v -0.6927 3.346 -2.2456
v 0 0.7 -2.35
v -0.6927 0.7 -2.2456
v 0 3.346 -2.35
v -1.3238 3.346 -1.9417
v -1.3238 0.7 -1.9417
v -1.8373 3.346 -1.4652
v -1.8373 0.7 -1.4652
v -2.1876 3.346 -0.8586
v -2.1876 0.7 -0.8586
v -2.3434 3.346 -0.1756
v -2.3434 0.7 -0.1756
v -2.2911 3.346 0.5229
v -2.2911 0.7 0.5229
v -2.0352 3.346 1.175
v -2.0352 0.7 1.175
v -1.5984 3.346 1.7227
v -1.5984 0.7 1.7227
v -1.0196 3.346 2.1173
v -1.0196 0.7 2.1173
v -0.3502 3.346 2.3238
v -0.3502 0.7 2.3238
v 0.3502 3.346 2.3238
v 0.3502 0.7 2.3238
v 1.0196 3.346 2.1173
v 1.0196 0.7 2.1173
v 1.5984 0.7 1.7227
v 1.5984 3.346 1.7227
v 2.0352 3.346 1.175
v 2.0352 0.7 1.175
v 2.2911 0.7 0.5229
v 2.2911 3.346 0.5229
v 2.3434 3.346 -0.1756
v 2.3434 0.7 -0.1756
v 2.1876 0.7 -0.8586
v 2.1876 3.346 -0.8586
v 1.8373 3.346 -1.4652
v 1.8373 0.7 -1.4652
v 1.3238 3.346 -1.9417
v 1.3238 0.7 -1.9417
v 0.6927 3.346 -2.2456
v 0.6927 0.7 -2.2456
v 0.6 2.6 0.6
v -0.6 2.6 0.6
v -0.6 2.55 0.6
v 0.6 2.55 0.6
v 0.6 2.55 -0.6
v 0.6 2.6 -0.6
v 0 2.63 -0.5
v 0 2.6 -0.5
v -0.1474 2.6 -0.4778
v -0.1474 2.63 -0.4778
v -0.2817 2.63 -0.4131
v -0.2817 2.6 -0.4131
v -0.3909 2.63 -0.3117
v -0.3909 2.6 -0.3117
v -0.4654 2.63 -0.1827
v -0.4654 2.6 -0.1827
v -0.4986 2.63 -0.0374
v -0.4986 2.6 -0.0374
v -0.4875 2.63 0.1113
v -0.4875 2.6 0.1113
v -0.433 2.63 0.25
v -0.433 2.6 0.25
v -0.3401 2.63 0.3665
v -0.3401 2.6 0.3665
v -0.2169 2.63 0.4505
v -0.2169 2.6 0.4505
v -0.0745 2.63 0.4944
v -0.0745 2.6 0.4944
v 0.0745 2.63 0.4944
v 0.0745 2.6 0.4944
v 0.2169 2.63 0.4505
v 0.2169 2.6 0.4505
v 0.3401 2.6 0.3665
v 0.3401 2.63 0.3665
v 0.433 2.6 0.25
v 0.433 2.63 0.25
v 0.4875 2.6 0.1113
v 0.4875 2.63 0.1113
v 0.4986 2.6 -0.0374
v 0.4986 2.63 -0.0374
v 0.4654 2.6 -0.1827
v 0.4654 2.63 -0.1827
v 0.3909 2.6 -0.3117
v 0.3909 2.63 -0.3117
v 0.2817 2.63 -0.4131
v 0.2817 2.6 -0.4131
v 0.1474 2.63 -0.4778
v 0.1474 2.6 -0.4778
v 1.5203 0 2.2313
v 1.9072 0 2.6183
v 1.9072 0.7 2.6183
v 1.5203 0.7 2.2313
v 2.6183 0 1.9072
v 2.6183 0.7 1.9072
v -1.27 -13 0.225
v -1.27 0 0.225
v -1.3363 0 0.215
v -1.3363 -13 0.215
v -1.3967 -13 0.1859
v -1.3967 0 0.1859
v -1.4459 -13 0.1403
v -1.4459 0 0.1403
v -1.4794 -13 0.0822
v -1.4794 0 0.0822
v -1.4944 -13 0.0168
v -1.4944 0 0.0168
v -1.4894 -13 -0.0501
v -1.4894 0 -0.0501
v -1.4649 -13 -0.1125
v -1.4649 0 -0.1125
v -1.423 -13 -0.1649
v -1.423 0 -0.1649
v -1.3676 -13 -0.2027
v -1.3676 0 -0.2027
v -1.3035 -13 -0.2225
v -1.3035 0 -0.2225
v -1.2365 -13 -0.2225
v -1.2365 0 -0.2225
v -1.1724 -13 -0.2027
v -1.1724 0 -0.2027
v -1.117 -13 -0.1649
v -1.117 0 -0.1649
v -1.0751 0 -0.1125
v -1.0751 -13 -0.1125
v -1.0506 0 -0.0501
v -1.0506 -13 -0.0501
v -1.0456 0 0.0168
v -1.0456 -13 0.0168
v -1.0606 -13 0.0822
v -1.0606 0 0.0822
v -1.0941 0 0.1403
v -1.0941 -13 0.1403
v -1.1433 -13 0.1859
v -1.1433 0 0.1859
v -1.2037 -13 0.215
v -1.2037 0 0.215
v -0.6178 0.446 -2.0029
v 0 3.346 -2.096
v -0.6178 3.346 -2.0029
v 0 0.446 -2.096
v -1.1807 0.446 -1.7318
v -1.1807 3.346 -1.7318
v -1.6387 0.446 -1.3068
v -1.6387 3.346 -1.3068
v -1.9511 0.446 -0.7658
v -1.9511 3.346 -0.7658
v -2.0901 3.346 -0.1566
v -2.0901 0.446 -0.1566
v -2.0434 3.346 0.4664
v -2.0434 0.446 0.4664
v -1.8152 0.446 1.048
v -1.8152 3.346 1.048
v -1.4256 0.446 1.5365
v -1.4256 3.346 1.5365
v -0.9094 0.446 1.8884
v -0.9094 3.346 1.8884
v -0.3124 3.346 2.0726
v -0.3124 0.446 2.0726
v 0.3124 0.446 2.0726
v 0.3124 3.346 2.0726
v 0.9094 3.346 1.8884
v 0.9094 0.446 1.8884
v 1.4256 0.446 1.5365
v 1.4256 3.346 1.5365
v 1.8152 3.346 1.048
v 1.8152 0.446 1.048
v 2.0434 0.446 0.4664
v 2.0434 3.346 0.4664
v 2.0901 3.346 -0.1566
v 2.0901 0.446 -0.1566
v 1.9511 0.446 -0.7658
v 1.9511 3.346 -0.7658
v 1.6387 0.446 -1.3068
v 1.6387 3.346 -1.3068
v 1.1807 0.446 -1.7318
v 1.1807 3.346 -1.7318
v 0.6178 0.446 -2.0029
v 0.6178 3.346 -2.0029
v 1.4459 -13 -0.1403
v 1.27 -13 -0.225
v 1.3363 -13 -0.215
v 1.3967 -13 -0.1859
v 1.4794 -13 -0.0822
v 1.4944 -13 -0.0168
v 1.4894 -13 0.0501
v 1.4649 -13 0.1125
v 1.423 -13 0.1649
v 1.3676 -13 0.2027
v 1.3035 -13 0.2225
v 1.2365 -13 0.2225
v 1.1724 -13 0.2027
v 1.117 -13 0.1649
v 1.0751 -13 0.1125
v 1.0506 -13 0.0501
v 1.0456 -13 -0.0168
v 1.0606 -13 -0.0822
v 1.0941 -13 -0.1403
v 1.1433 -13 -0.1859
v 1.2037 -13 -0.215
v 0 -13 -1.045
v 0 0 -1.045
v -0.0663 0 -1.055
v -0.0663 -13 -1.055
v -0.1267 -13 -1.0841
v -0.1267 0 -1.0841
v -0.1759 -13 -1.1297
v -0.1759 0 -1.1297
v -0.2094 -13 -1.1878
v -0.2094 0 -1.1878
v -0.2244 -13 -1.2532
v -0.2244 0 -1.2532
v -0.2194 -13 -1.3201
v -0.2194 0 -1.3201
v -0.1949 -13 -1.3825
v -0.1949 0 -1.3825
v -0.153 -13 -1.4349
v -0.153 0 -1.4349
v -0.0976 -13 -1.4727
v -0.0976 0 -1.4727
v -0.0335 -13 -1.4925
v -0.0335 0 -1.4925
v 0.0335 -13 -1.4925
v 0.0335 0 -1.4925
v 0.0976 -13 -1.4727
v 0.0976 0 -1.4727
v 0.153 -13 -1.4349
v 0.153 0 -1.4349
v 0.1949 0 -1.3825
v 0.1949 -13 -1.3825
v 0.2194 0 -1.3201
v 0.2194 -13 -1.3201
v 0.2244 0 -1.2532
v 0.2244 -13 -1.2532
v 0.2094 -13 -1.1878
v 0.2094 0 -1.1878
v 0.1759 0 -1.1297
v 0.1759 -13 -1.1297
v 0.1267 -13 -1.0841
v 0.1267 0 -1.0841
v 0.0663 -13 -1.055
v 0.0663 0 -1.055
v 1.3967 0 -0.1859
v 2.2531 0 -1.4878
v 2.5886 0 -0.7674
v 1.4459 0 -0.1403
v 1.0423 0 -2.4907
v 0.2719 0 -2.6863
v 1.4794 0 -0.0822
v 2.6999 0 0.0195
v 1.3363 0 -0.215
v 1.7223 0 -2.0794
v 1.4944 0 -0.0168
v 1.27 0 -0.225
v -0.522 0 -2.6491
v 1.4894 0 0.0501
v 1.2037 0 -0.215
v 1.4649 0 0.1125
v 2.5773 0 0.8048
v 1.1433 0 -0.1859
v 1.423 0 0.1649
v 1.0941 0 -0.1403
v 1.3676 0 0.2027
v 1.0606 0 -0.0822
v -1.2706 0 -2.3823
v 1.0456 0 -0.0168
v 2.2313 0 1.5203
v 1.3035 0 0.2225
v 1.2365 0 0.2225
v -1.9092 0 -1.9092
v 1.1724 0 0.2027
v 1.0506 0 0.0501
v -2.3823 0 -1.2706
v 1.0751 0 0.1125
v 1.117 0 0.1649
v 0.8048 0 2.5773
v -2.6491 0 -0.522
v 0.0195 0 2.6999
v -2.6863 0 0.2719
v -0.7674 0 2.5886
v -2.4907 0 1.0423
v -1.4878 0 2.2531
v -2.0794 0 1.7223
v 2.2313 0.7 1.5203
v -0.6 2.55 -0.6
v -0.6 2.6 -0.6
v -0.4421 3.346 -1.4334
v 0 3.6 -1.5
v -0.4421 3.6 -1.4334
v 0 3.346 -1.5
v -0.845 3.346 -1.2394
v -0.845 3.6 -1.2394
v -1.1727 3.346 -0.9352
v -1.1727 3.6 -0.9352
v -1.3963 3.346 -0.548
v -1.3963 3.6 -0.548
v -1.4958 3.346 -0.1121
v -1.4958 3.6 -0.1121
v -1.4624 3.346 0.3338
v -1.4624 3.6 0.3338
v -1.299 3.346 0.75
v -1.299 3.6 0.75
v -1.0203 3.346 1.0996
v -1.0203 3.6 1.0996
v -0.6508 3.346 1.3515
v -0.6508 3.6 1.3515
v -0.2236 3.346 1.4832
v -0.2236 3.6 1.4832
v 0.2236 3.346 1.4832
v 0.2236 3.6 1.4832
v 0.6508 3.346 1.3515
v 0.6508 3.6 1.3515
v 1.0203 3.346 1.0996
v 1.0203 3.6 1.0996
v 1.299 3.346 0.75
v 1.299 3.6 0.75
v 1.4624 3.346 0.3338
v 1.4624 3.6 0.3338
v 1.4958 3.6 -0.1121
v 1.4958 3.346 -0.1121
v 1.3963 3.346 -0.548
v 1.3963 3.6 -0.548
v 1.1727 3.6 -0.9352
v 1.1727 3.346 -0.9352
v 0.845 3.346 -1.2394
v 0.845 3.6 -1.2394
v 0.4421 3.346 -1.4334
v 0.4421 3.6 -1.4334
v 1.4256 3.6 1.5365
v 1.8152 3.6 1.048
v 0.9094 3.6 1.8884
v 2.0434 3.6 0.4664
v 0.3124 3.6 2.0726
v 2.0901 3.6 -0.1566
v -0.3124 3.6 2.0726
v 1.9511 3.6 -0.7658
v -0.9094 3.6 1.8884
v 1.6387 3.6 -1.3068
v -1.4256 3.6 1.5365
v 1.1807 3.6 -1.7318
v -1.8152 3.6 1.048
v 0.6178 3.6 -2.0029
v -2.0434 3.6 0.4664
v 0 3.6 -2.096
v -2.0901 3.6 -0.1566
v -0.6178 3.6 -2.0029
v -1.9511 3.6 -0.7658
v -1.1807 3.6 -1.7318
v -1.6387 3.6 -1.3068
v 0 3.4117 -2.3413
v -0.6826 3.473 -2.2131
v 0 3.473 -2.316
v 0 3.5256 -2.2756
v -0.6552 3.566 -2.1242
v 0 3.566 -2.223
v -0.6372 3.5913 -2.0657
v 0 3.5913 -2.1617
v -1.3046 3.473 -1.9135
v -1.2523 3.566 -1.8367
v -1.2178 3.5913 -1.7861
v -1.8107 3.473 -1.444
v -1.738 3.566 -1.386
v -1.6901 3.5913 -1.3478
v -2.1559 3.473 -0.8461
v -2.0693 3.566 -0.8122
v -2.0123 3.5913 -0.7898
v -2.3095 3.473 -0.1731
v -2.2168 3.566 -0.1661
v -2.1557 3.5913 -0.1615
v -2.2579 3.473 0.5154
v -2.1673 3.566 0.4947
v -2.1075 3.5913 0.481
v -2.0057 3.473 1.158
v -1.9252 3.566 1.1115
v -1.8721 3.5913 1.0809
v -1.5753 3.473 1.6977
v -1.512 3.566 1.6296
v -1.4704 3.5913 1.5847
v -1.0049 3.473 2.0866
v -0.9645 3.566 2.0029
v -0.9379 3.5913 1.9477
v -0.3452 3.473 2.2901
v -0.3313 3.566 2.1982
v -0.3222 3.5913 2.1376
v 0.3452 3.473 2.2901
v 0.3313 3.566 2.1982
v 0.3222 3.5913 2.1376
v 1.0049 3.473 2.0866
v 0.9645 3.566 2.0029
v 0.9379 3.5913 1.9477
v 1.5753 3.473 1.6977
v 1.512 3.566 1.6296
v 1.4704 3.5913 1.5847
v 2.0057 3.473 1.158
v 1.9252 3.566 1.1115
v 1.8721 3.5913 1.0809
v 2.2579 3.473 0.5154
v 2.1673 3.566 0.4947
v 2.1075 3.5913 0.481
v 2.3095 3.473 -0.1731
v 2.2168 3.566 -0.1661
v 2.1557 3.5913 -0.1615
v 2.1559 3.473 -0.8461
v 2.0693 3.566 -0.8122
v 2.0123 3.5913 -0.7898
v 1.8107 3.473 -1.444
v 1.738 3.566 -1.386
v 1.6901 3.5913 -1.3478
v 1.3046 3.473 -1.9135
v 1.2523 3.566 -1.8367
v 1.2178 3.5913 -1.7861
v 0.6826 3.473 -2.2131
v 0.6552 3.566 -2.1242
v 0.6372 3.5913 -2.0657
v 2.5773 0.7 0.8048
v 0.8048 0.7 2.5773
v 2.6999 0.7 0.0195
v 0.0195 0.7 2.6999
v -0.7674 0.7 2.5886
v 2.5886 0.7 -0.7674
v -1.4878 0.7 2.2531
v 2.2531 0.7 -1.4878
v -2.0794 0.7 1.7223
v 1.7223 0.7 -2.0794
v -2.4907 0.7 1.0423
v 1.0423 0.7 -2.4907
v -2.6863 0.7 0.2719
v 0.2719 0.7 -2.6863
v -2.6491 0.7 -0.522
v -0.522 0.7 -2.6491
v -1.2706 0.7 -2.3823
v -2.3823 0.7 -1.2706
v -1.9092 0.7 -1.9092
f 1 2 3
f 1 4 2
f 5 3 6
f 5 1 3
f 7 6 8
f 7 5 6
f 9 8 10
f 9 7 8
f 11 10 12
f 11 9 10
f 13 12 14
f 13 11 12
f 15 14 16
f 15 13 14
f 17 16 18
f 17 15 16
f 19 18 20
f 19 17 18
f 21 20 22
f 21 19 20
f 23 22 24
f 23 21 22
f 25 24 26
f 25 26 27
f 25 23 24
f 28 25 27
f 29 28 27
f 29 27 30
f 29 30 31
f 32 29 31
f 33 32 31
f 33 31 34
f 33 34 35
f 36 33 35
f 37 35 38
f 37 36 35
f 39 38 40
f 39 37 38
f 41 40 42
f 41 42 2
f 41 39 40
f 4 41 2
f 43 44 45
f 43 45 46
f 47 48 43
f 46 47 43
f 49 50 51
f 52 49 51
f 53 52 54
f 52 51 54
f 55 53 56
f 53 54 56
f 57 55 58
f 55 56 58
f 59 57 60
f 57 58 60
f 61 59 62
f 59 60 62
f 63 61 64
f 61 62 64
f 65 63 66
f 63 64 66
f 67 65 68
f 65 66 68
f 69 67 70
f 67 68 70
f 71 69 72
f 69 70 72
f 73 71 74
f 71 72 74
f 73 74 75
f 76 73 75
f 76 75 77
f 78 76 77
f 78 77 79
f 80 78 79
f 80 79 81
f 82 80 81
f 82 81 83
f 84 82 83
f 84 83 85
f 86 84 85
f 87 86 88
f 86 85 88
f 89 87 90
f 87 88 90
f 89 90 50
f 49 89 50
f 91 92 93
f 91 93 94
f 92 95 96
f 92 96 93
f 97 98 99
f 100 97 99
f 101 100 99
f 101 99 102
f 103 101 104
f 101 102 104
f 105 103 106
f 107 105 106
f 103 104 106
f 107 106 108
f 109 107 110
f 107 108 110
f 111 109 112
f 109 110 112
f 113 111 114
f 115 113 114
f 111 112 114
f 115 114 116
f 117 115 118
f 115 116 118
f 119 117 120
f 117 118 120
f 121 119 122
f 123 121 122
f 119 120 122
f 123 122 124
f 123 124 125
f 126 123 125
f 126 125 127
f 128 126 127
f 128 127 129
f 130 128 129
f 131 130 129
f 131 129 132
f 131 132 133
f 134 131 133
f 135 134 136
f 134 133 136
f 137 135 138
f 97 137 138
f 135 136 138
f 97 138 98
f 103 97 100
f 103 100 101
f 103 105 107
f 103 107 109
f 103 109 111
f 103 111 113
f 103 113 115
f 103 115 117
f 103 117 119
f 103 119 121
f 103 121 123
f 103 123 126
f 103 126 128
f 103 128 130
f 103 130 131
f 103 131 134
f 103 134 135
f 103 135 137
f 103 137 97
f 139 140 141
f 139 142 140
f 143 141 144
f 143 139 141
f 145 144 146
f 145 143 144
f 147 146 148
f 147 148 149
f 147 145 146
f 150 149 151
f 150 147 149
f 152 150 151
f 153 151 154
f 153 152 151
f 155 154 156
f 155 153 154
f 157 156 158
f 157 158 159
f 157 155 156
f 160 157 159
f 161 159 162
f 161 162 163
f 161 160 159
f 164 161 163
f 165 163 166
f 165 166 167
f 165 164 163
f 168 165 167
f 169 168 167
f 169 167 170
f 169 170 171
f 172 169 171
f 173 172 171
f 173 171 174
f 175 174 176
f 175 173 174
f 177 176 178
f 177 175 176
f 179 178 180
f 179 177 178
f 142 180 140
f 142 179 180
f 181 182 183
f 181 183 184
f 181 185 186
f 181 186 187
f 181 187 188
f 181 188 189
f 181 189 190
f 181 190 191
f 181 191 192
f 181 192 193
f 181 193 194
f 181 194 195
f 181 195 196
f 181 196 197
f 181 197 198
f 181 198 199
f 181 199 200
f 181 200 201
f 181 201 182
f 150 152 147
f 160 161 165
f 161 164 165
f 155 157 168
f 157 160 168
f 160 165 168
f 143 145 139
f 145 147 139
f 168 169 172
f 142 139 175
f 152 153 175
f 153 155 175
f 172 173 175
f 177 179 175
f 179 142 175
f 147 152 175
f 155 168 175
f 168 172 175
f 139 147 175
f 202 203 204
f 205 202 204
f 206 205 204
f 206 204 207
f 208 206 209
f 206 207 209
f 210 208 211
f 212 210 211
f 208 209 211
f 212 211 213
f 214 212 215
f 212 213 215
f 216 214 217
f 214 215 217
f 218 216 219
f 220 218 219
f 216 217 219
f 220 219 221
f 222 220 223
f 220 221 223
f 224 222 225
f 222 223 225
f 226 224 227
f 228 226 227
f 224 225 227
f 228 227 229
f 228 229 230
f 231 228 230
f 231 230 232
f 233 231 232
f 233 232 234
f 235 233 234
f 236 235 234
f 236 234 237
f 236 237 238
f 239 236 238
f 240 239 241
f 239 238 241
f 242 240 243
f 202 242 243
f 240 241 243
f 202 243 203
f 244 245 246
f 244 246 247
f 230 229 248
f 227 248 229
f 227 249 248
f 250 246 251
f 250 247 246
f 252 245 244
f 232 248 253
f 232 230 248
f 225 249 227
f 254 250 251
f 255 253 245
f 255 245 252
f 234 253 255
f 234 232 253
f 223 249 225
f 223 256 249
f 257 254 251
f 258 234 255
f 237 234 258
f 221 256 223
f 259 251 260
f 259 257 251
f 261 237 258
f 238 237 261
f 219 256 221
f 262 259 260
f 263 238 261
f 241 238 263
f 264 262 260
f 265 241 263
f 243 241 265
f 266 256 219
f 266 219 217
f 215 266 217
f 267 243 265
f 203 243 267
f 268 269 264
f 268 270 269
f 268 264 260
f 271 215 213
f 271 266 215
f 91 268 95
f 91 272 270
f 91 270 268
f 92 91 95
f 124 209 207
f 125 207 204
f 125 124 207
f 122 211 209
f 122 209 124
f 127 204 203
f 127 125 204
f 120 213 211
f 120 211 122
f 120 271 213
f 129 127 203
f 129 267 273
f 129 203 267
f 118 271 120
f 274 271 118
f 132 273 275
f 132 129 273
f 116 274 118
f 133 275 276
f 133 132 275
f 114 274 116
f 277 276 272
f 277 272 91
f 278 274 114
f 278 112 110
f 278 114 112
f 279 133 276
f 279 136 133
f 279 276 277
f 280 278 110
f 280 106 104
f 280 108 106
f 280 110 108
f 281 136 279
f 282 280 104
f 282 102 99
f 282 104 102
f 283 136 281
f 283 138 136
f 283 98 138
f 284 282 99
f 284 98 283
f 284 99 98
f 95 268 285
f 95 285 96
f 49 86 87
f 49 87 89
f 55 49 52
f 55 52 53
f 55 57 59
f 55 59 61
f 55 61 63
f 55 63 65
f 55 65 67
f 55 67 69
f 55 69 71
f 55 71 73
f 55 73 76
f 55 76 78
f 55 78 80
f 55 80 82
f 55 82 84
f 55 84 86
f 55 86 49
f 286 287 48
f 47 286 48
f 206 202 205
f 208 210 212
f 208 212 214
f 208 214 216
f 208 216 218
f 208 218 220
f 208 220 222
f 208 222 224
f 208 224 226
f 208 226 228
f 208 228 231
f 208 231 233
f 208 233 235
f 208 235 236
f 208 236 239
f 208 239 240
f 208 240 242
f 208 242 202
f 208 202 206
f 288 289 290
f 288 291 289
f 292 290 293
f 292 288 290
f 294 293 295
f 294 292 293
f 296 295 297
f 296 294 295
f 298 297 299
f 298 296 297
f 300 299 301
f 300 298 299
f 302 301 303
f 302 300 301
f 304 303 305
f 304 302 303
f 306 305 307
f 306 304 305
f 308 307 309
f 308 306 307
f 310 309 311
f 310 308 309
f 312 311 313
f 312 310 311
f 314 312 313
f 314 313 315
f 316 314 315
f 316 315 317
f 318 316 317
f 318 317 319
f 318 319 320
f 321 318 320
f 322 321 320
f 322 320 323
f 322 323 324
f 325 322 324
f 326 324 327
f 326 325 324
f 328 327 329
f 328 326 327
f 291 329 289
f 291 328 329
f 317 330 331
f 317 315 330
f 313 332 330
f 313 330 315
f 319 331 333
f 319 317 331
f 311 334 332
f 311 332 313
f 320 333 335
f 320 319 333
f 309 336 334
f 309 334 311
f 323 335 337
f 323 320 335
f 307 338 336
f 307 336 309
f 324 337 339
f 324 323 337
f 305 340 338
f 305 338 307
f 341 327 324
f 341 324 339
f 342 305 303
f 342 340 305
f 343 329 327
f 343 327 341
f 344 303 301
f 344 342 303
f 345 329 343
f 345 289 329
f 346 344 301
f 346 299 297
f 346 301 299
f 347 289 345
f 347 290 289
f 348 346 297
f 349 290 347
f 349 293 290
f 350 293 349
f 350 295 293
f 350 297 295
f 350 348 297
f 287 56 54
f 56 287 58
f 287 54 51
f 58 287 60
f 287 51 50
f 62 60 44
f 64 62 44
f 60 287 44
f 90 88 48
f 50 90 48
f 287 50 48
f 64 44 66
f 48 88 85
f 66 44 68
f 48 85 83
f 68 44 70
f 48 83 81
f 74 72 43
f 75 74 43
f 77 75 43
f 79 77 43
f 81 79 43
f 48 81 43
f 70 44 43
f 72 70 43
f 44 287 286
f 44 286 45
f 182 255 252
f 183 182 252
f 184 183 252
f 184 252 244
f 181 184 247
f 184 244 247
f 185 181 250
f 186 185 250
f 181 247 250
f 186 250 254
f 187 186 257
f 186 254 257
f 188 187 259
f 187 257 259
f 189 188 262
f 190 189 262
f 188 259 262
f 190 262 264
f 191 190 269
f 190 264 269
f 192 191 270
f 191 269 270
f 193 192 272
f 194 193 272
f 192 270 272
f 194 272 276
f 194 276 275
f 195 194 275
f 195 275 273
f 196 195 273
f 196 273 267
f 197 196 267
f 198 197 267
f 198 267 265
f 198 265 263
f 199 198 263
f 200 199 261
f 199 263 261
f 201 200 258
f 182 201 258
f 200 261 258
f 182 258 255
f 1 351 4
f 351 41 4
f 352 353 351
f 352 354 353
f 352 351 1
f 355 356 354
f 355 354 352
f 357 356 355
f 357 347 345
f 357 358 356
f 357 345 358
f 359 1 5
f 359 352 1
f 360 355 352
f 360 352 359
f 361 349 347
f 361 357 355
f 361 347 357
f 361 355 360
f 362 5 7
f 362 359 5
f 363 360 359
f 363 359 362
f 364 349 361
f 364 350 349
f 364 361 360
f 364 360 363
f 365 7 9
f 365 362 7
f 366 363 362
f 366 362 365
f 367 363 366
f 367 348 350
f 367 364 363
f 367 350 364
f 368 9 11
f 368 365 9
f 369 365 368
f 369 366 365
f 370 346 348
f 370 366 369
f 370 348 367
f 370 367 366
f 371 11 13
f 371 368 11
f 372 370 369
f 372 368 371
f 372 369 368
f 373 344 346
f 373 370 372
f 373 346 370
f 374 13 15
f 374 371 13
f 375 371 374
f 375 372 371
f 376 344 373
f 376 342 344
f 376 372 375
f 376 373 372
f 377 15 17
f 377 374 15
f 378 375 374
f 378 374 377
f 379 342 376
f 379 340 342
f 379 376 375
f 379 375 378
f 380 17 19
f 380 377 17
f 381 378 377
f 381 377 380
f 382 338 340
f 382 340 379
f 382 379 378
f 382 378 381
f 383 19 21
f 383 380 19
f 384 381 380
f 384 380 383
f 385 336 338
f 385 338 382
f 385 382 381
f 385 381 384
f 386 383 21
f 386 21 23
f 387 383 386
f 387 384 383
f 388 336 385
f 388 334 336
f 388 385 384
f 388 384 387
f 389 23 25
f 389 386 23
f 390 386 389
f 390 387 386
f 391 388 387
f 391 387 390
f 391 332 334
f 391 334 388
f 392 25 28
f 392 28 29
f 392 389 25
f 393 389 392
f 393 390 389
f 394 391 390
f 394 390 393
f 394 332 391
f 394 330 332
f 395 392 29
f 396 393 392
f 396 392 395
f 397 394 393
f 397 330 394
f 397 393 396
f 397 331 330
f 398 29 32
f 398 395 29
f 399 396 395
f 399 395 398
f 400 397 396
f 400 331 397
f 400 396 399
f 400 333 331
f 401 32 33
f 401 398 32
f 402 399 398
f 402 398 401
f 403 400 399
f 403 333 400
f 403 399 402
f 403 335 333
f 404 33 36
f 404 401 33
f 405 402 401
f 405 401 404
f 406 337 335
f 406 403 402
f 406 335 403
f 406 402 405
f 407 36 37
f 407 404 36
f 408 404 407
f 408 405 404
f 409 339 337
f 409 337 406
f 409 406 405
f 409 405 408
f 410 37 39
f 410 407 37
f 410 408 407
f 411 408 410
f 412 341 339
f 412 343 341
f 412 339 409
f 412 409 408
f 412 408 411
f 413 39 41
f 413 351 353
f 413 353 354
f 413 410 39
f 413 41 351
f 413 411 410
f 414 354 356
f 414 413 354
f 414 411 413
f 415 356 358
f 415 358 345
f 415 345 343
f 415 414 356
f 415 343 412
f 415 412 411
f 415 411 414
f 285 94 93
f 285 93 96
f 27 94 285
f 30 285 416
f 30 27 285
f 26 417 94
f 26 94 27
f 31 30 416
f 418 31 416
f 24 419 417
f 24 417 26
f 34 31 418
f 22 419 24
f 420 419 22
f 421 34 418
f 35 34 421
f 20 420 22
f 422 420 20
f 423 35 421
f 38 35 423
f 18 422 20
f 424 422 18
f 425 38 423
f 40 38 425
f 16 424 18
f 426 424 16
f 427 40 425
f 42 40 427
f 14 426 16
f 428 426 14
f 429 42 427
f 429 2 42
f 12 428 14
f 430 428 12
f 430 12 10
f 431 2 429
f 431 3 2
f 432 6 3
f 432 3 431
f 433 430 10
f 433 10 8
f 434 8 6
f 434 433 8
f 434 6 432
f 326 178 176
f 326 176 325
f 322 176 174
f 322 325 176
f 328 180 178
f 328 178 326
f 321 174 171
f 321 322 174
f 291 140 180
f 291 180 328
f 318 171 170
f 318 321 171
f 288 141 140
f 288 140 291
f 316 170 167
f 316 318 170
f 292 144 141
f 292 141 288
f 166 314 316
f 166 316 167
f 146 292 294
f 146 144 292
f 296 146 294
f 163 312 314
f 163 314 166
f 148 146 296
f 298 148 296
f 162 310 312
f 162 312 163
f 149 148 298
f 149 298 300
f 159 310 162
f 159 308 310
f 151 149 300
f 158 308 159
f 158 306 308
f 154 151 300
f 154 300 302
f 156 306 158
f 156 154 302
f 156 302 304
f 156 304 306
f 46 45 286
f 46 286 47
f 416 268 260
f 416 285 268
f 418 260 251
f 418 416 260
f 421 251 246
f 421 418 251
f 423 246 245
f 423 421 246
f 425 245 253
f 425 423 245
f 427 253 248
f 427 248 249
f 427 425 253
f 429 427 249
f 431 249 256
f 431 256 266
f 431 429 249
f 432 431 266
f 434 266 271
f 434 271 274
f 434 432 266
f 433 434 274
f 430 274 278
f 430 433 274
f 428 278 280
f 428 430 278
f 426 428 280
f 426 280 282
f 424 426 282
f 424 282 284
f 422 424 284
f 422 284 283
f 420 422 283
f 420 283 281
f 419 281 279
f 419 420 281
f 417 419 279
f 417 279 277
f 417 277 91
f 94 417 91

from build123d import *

# Parameters (mm, degrees)
SKETCH2_R           = 2.7
BOSS_EXTRUDE1_DEPTH = 0.446
BOSS_EXTRUDE2_START = -2.6
SKETCH3_W           = 1.2
SKETCH3_H           = 1.2
BOSS_EXTRUDE2_DEPTH = 0.05
SKETCH8_R           = 0.5
BOSS_EXTRUDE6_DEPTH = 0.03
BOSS_EXTRUDE7_DEPTH = 0.7
SKETCH5_R           = 0.225
BOSS_EXTRUDE8_DEPTH = 13


with BuildPart() as part:
    # Sketch1 → Revolve-Thin2 (revolve)
    with BuildSketch(Plane.XY, mode=Mode.PRIVATE) as revolve_thin2_sk:
        with BuildLine():
            Line((2.7, 0), (2.7, 0.7))
            Line((2.7, 0.7), (2.35, 0.7))
            Line((2.35, 0.7), (2.35, 3.346))
            ThreePointArc((2.35, 3.346), (2.275605122, 3.525605122), (2.096, 3.6))
            Line((2.096, 3.6), (1.5, 3.6))
            Line((1.5, 3.6), (1.5, 3.346))
            Line((1.5, 3.346), (2.096, 3.346))
            Line((2.096, 3.346), (2.096, 0.446))
            Line((2.096, 0.446), (2.446, 0.446))
            Line((2.446, 0.446), (2.446, 0))
            Line((2.446, 0), (2.7, 0))
        make_face()
    revolve(revolve_thin2_sk.sketch.rotate(Axis((0, 0, 0), (0, 1, 0)), 90), axis=Axis((0, 0, 0), (0, 1, 0)))  # turned: the seam where the file's is

    # Sketch2 → Boss-Extrude1 (add)
    with BuildSketch(Plane.XZ):
        with Locations(Location((0, 0, 0), (0, 0, 270))):  # turned: the seam where the file's is
            Circle(SKETCH2_R)
    extrude(amount=-BOSS_EXTRUDE1_DEPTH)

    # Sketch10 → Boss-Extrude7 (add)
    with BuildSketch(Plane.XZ):
        Polygon((1.520284949, 2.231307616), (2.231307616, 1.520284949), (2.618253033, 1.907230366), (1.907230366, 2.618253033), align=None)
    extrude(amount=-BOSS_EXTRUDE7_DEPTH)

    # Sketch5 → Boss-Extrude8 (add)
    with BuildSketch(Plane.XZ):
        with Locations(Location((-1.27, 0, 0), (0, 0, 90))):  # turned: the seam where the file's is
            Circle(SKETCH5_R)
        with Locations(Location((0, -1.27, 0), (0, 0, 90))):  # turned: the seam where the file's is
            Circle(SKETCH5_R)
        with Locations(Location((1.27, 0, 0), (0, 0, 270))):  # turned: the seam where the file's is
            Circle(SKETCH5_R)
    extrude(amount=BOSS_EXTRUDE8_DEPTH)


with BuildPart() as body_2:
    # Sketch3 → Boss-Extrude2 (new body)
    with BuildSketch(Plane.XZ.offset(BOSS_EXTRUDE2_START)):
        Rectangle(SKETCH3_W, SKETCH3_H)
    extrude(amount=BOSS_EXTRUDE2_DEPTH)

    # Sketch8 → Boss-Extrude6 (add)
    with BuildSketch(Plane(origin=(0, 2.6, 0), x_dir=(-1, 0, 0), z_dir=(0, 1, 0))):
        with Locations(Location((0, 0, 0), (0, 0, 270))):  # turned: the seam where the file's is
            Circle(SKETCH8_R)
    extrude(amount=BOSS_EXTRUDE6_DEPTH)


solid = Compound([part.part, body_2.part])
